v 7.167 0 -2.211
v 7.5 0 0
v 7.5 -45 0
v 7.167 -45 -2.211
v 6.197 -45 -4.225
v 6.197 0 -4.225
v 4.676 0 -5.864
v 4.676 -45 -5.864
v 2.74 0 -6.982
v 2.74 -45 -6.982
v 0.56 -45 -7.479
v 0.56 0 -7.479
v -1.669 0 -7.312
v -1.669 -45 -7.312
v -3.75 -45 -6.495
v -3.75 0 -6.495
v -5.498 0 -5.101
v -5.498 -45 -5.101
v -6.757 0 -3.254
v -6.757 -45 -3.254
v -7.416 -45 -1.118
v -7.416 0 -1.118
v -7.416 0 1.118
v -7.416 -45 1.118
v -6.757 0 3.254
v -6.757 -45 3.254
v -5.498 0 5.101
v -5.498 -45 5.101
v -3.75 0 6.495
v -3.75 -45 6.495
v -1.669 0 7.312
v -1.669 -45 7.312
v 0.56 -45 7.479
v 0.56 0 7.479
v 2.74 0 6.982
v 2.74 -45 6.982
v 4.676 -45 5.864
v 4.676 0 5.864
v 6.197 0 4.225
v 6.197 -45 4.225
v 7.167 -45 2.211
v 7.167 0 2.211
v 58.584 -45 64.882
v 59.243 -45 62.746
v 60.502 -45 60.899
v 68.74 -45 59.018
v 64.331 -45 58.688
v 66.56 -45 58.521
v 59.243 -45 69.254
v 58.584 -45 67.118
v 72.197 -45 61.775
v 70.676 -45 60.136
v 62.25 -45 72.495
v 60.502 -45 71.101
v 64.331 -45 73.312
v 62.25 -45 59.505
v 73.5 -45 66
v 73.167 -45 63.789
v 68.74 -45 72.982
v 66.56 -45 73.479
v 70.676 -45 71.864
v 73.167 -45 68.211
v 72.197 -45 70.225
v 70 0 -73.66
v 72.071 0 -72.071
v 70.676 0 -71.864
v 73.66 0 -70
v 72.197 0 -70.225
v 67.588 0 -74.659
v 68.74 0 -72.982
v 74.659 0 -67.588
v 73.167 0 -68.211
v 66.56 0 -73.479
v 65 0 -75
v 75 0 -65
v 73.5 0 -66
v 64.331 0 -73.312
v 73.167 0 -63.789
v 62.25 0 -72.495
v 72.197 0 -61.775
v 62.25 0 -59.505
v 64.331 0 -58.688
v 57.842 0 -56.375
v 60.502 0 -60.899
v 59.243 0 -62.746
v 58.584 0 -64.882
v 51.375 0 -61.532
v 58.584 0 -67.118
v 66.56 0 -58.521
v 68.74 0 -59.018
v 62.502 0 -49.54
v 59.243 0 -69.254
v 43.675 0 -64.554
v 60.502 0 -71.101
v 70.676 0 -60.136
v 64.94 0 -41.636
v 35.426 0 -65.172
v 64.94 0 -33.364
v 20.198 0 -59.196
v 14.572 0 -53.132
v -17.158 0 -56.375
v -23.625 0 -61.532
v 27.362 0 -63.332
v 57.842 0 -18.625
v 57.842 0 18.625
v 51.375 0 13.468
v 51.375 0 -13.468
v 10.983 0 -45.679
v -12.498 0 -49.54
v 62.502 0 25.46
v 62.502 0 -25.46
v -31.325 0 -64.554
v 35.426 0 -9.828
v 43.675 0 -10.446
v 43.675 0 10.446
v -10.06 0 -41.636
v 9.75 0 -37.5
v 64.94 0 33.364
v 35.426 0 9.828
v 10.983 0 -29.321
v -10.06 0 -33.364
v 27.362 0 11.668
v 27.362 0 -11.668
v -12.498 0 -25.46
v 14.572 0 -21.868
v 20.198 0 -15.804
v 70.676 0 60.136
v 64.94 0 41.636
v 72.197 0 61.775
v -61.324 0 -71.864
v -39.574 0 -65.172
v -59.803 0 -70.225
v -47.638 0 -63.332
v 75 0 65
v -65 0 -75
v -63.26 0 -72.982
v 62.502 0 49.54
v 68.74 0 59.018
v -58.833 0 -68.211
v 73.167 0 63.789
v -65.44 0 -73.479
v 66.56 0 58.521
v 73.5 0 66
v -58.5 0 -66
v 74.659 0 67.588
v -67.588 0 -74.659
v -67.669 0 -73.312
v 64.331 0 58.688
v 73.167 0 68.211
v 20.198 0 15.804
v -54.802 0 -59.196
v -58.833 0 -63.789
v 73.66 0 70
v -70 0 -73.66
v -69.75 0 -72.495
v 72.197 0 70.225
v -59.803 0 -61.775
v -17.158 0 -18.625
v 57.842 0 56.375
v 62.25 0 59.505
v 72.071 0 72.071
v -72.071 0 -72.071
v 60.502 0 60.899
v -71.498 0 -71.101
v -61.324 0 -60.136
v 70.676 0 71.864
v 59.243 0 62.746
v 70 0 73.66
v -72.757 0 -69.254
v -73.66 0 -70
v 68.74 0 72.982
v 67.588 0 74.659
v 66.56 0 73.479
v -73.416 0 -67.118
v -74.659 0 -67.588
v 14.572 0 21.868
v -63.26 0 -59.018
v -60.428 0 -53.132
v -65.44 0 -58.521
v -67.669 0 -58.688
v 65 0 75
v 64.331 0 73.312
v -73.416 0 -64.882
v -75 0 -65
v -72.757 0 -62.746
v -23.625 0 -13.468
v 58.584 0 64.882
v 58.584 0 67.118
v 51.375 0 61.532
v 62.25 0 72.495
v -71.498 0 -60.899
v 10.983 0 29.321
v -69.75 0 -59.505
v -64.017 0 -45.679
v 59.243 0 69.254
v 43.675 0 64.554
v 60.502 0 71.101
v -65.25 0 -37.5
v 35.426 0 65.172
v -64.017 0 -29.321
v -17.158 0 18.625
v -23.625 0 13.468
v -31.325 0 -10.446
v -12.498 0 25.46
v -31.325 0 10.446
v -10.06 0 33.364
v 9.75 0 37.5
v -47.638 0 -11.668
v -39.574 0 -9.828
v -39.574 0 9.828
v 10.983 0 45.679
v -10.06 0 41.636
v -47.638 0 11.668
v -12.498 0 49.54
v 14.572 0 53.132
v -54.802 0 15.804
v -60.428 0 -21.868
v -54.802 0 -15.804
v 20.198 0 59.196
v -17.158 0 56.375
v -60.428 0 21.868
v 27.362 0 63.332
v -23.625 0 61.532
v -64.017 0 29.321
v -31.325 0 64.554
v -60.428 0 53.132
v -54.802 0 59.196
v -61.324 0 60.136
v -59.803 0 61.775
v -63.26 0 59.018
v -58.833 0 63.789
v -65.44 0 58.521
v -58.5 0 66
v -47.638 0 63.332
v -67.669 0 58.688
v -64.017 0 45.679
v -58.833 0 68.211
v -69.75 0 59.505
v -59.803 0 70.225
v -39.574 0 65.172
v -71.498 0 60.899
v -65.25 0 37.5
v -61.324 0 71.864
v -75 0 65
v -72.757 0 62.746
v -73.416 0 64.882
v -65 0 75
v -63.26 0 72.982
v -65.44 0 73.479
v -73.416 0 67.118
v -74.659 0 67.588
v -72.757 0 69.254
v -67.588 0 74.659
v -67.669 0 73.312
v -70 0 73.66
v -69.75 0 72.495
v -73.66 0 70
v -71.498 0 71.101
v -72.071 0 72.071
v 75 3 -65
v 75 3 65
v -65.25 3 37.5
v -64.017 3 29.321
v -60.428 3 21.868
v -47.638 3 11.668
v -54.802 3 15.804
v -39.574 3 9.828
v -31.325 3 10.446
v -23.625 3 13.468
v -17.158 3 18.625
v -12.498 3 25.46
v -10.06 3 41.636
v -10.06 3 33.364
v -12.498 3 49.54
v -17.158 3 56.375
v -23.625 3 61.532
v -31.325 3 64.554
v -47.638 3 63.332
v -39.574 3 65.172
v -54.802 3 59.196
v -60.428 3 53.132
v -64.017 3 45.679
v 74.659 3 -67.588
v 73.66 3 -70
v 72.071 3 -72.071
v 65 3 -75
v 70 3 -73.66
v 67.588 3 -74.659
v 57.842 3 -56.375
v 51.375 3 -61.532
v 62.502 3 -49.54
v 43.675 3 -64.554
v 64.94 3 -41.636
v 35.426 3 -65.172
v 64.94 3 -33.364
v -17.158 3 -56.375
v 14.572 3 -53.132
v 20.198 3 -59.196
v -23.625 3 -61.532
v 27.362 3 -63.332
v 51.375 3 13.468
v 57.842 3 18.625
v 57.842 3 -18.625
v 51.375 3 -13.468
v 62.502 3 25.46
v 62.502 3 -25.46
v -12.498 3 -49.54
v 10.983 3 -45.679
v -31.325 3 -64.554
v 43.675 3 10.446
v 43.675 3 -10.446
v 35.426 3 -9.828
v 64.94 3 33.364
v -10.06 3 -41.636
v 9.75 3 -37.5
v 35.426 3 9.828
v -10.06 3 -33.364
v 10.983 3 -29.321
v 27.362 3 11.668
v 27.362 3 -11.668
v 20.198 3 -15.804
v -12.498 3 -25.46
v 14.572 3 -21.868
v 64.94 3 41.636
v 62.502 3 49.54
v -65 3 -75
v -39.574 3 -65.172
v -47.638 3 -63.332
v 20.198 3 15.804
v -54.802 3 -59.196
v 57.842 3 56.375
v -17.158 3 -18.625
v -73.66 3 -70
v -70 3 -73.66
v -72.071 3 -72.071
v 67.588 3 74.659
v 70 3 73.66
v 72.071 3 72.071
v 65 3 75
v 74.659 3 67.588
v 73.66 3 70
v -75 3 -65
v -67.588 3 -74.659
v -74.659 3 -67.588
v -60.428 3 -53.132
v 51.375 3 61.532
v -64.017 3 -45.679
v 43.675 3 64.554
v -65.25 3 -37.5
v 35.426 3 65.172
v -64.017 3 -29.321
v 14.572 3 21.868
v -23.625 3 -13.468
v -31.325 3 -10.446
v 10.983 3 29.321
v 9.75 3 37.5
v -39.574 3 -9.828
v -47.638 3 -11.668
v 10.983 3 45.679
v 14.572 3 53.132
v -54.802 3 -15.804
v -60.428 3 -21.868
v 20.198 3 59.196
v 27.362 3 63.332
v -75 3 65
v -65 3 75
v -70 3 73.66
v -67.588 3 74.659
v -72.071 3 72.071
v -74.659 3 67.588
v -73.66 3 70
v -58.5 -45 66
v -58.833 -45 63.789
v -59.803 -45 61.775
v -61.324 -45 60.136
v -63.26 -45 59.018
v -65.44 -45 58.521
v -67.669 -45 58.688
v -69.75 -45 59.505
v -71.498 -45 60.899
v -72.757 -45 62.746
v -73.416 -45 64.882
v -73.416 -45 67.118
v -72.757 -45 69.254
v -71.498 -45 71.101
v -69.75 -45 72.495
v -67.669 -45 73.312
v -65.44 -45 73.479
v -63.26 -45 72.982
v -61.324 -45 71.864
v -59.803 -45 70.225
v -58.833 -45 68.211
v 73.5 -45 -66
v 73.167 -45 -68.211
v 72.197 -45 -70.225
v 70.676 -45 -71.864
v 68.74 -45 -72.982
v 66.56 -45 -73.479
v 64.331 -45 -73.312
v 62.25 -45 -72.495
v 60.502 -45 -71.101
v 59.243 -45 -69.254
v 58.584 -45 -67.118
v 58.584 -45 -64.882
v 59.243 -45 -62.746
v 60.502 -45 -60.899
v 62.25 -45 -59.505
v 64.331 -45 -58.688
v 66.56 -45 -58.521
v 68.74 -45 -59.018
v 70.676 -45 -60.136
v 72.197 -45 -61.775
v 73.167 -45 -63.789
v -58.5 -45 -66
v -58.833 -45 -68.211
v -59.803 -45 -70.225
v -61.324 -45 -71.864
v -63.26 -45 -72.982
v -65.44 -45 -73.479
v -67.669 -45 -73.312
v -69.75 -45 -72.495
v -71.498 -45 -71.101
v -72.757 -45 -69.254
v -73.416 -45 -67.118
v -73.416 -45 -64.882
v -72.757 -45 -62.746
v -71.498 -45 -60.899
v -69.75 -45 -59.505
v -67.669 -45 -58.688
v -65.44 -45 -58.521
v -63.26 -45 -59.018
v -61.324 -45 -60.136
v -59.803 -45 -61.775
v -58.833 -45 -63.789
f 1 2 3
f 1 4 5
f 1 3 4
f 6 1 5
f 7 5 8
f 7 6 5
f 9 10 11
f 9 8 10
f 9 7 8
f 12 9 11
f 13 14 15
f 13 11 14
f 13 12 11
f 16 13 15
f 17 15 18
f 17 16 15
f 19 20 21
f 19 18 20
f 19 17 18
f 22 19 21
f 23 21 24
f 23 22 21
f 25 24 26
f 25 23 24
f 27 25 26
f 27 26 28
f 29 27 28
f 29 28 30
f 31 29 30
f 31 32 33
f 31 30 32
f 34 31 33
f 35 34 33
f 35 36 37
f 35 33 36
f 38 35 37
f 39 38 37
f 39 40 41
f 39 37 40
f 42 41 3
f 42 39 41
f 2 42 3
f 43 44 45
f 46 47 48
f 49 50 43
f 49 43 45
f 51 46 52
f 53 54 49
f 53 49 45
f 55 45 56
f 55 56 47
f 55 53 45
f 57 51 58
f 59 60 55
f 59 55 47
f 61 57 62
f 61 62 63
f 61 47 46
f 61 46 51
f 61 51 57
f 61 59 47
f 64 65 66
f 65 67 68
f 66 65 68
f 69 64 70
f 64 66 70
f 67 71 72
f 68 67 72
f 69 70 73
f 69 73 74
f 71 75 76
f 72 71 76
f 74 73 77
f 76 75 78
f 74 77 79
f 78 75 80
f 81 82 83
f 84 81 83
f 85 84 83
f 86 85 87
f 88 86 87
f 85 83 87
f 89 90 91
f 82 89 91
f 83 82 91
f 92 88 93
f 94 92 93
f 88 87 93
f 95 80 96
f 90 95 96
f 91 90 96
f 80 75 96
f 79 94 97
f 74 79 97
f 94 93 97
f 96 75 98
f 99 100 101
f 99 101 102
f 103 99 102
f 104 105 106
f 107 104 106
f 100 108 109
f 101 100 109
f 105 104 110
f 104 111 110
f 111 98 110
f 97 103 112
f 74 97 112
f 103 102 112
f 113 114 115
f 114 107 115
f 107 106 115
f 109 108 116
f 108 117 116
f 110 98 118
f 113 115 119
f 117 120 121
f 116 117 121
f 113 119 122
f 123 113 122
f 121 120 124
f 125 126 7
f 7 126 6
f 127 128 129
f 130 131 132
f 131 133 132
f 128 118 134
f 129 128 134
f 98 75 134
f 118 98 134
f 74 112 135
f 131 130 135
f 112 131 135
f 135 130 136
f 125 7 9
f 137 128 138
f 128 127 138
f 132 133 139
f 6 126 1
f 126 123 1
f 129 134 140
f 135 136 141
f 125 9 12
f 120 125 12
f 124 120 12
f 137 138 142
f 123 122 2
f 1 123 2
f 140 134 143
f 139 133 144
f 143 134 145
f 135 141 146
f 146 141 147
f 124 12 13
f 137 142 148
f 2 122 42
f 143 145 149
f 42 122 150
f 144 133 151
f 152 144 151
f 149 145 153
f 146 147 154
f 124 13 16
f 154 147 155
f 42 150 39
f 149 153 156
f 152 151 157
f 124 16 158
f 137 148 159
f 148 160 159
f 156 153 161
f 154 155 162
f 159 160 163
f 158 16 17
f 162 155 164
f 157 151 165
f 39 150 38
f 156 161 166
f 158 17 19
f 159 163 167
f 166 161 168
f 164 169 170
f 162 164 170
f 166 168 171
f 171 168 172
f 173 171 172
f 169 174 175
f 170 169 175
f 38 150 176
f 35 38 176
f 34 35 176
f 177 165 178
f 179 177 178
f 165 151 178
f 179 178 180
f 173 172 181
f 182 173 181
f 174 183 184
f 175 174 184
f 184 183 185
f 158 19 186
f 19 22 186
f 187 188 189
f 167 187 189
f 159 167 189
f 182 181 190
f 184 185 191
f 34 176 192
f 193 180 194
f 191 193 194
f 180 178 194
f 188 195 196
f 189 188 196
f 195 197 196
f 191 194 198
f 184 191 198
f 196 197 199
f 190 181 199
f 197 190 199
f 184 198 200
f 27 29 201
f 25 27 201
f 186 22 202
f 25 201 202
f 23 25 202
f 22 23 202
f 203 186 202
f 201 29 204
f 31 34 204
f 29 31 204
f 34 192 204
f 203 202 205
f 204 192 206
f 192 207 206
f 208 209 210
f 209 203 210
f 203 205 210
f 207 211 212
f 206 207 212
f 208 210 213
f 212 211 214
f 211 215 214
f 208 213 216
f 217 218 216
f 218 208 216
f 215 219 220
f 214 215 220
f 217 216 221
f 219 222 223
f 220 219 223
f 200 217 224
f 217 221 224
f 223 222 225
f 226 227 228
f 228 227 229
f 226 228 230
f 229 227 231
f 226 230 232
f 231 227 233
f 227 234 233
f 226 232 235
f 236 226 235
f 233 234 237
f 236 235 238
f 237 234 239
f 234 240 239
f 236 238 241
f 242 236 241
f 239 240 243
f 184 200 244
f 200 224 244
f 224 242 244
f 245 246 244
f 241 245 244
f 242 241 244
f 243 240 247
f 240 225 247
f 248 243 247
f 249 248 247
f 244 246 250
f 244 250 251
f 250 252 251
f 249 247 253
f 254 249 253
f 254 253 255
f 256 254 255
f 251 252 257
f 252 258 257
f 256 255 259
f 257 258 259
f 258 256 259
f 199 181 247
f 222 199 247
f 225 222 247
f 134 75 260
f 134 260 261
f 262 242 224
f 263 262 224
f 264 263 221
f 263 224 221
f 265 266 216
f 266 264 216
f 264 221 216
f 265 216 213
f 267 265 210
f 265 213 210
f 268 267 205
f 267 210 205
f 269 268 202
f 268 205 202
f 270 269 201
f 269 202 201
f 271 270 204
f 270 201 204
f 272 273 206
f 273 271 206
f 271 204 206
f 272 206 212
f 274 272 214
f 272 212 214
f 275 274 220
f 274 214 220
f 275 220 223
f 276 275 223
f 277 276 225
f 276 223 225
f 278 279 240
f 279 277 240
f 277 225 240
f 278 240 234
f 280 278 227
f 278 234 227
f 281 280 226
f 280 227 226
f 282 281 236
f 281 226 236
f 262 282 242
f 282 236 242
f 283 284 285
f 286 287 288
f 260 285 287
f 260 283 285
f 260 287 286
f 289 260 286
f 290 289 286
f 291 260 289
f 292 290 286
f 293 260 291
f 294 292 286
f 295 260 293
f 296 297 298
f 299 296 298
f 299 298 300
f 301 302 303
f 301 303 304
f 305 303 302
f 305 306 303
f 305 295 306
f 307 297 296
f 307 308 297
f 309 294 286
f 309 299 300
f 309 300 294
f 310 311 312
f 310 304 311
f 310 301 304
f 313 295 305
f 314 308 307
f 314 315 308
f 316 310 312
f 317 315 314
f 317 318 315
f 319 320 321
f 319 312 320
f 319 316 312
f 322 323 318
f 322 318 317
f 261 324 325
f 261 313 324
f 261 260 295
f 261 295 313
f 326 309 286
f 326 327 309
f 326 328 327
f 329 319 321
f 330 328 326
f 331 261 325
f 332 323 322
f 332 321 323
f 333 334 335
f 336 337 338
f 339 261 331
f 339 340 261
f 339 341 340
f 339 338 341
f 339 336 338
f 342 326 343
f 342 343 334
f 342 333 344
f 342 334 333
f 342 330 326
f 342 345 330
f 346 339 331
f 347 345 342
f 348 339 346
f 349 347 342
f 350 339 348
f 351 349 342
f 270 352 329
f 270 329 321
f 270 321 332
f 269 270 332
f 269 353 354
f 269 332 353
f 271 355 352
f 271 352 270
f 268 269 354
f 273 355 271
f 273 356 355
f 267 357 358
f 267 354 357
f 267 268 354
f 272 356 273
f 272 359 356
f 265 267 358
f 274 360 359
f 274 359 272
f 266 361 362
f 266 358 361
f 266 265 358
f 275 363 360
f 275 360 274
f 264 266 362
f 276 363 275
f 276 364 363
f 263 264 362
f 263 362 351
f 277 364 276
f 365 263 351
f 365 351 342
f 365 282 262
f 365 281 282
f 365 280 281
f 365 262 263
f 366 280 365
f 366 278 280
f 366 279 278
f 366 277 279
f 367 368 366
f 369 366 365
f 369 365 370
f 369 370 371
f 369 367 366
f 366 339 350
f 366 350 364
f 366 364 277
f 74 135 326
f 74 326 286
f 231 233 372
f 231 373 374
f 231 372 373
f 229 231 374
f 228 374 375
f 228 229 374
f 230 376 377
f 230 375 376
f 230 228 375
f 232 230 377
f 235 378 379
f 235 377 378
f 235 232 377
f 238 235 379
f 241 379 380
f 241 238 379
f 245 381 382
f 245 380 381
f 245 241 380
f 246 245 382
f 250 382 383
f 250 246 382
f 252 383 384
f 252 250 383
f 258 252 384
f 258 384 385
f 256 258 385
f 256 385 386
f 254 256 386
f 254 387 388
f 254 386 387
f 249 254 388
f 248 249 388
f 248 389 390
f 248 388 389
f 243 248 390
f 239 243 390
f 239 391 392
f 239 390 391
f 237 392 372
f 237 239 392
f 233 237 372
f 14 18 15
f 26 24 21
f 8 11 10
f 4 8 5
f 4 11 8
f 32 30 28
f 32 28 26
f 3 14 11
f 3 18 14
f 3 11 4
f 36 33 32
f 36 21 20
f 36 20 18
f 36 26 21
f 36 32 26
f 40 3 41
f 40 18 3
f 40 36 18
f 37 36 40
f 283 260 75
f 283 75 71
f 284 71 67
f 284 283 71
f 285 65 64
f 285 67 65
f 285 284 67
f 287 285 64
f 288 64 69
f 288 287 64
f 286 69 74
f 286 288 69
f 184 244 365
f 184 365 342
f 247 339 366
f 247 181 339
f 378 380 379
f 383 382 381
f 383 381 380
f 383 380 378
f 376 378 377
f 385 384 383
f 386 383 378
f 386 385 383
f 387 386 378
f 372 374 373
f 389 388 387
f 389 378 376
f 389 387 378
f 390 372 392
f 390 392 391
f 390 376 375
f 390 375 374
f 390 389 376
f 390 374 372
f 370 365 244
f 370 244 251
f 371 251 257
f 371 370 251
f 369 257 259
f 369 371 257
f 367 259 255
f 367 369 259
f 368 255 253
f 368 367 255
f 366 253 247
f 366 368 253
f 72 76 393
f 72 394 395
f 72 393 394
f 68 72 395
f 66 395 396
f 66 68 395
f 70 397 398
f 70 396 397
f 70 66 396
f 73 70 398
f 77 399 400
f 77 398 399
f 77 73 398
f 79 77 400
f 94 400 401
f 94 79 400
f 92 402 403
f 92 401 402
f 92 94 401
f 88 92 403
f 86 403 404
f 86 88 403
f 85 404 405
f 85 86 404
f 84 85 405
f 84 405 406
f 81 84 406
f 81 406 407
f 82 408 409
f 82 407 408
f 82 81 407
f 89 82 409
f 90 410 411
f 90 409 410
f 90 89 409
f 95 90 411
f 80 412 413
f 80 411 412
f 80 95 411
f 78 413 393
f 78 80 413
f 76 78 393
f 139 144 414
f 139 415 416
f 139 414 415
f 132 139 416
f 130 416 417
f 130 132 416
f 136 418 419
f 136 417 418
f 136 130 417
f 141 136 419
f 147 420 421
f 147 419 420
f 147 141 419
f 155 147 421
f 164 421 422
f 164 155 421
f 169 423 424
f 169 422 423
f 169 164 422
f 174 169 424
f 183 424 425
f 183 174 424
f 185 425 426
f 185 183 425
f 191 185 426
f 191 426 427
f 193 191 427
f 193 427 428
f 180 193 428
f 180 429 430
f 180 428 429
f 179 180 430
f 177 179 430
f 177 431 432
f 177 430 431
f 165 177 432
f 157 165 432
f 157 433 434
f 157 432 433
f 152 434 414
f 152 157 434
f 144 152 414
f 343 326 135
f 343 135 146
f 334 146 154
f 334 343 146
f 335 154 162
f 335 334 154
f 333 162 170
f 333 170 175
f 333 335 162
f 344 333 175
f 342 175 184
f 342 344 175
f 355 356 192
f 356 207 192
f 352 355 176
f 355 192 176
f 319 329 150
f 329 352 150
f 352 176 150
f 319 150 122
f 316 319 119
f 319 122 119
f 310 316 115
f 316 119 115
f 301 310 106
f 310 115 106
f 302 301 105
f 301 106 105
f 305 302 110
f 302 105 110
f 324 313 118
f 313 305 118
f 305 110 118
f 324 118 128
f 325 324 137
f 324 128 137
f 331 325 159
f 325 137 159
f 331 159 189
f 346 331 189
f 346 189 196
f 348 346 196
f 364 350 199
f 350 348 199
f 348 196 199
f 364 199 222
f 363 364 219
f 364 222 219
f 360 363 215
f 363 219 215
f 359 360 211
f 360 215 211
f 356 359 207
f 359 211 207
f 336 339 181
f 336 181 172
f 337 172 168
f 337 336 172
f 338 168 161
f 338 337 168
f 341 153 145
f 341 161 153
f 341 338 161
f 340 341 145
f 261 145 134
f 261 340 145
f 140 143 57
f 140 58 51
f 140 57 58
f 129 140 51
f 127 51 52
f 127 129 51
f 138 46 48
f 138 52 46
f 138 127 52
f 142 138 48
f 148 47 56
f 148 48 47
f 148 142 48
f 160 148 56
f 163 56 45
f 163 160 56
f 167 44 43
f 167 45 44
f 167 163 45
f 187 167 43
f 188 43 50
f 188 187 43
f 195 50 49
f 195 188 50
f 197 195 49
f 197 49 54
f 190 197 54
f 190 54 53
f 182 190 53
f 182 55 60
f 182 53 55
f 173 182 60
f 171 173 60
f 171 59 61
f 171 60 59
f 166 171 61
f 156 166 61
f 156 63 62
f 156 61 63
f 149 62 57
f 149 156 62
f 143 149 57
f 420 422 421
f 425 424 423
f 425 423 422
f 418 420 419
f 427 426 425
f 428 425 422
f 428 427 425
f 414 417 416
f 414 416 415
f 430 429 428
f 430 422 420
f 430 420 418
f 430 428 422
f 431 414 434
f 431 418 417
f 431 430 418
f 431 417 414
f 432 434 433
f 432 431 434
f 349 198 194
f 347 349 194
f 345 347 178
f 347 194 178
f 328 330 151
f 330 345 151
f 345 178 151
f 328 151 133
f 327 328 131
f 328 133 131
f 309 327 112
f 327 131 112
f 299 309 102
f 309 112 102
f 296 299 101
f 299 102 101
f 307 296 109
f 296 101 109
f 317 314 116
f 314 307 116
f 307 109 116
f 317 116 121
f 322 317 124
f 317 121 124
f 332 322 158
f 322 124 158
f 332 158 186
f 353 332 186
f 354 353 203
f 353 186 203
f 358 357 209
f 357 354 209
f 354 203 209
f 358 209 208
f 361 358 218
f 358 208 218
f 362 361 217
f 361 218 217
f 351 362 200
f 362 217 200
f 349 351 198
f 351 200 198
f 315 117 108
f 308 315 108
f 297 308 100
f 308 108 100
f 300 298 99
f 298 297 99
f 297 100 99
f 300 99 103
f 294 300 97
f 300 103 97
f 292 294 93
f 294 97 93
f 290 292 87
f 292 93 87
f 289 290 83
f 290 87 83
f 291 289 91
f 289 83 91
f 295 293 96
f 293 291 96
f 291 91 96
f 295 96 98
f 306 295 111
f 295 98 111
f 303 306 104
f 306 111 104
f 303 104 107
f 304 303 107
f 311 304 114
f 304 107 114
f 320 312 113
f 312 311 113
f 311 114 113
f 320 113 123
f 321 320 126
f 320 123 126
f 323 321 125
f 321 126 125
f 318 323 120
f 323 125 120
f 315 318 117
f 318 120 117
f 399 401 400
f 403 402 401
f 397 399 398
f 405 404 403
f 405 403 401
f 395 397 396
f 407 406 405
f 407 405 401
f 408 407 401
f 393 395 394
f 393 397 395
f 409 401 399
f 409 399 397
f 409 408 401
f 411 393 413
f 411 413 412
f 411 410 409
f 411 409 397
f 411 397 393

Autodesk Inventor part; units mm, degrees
ref_plane "YZ Plane" through (0, 0, 0) normal (1, 0, 0) x (0, 1, 0)
ref_plane "XZ Plane" through (0, 0, 0) normal (0, 1, 0) x (-1, 0, 0)
ref_plane "XY Plane" through (0, 0, 0) normal (0, 0, 1) x (1, 0, 0)
sketch "Sketch1" plane through (0, 0, 0) normal (0, 1, 0) x (-1, 0, 0)
  line L0 (37.5, -37.5) -> (-37.5, -37.5) construction
  line L1 (-37.5, -37.5) -> (-37.5, 37.5) construction
  line L2 (-37.5, 37.5) -> (37.5, 37.5) construction
  line L3 (37.5, 37.5) -> (37.5, -37.5) construction
  circle A0 centre (37.5, -37.5) radius 27 construction
  circle A1 centre (-37.5, -37.5) radius 27 construction
  circle A2 centre (-37.5, 37.5) radius 27 construction
  circle A3 centre (37.5, 37.5) radius 27 construction
  circle A4 centre (37.5, -37.5) radius 27.75
  circle A5 centre (-37.5, -37.5) radius 27.75
  circle A6 centre (-37.5, 37.5) radius 27.75
  circle A7 centre (37.5, 37.5) radius 27.75
  line L4 (75, -75) -> (-75, -75)
  line L5 (-75, -75) -> (-75, 75)
  line L6 (-75, 75) -> (75, 75)
  line L7 (75, 75) -> (75, -75)
  point P0 (0, 0)
  point P1 (-37.5, 0)
  point P2 (0, -37.5)
  point P3 (-75, 0)
  point P4 (0, -75)
  dimension "d0" = 75
  dimension "d1" = 54
  dimension "d2" = 0.75
  dimension "d3" = 0.75
  dimension "d4" = 0.75
  dimension "d5" = 0.75
  dimension "d6" = 150
extrude "Extrusion1" add sketch "Sketch1" along normal blind 3
sketch "Sketch2" plane through (0, 0, 0) normal (0, -1, 0) x (1, 0, 0)
  circle A0 centre (0, 0) radius 7.5
  line L0 (-75, 75) -> (75, 75) construction
  line L1 (-75, -75) -> (-75, 75) construction
  line L2 (75, -75) -> (-75, -75) construction
  line L3 (75, 75) -> (75, -75) construction
  circle A1 centre (-37.5, 37.5) radius 27.75 construction
  circle A2 centre (37.5, 37.5) radius 27.75 construction
  circle A3 centre (37.5, -37.5) radius 27.75 construction
  circle A4 centre (-37.5, -37.5) radius 27.75 construction
  line L4 (66, 66) -> (-66, 66) construction
  line L5 (-66, 66) -> (-66, -66) construction
  line L6 (-66, -66) -> (66, -66) construction
  line L7 (66, -66) -> (66, 66) construction
  circle A5 centre (-66, 66) radius 7.5
  circle A6 centre (66, 66) radius 7.5
  circle A7 centre (-66, -66) radius 7.5
  circle A8 centre (66, -66) radius 7.5
  dimension "d9" = 15
  dimension "d10" = 9
extrude "Extrusion2" add sketch "Sketch2" along normal blind 45
fillet "Fillet1" radius 10 4 edges at (-75, 1.5, 75) (75, 1.5, 75) (75, 1.5, -75) (-75, 1.5, -75)
properties part number "4BeakerStand_3DPrint"
